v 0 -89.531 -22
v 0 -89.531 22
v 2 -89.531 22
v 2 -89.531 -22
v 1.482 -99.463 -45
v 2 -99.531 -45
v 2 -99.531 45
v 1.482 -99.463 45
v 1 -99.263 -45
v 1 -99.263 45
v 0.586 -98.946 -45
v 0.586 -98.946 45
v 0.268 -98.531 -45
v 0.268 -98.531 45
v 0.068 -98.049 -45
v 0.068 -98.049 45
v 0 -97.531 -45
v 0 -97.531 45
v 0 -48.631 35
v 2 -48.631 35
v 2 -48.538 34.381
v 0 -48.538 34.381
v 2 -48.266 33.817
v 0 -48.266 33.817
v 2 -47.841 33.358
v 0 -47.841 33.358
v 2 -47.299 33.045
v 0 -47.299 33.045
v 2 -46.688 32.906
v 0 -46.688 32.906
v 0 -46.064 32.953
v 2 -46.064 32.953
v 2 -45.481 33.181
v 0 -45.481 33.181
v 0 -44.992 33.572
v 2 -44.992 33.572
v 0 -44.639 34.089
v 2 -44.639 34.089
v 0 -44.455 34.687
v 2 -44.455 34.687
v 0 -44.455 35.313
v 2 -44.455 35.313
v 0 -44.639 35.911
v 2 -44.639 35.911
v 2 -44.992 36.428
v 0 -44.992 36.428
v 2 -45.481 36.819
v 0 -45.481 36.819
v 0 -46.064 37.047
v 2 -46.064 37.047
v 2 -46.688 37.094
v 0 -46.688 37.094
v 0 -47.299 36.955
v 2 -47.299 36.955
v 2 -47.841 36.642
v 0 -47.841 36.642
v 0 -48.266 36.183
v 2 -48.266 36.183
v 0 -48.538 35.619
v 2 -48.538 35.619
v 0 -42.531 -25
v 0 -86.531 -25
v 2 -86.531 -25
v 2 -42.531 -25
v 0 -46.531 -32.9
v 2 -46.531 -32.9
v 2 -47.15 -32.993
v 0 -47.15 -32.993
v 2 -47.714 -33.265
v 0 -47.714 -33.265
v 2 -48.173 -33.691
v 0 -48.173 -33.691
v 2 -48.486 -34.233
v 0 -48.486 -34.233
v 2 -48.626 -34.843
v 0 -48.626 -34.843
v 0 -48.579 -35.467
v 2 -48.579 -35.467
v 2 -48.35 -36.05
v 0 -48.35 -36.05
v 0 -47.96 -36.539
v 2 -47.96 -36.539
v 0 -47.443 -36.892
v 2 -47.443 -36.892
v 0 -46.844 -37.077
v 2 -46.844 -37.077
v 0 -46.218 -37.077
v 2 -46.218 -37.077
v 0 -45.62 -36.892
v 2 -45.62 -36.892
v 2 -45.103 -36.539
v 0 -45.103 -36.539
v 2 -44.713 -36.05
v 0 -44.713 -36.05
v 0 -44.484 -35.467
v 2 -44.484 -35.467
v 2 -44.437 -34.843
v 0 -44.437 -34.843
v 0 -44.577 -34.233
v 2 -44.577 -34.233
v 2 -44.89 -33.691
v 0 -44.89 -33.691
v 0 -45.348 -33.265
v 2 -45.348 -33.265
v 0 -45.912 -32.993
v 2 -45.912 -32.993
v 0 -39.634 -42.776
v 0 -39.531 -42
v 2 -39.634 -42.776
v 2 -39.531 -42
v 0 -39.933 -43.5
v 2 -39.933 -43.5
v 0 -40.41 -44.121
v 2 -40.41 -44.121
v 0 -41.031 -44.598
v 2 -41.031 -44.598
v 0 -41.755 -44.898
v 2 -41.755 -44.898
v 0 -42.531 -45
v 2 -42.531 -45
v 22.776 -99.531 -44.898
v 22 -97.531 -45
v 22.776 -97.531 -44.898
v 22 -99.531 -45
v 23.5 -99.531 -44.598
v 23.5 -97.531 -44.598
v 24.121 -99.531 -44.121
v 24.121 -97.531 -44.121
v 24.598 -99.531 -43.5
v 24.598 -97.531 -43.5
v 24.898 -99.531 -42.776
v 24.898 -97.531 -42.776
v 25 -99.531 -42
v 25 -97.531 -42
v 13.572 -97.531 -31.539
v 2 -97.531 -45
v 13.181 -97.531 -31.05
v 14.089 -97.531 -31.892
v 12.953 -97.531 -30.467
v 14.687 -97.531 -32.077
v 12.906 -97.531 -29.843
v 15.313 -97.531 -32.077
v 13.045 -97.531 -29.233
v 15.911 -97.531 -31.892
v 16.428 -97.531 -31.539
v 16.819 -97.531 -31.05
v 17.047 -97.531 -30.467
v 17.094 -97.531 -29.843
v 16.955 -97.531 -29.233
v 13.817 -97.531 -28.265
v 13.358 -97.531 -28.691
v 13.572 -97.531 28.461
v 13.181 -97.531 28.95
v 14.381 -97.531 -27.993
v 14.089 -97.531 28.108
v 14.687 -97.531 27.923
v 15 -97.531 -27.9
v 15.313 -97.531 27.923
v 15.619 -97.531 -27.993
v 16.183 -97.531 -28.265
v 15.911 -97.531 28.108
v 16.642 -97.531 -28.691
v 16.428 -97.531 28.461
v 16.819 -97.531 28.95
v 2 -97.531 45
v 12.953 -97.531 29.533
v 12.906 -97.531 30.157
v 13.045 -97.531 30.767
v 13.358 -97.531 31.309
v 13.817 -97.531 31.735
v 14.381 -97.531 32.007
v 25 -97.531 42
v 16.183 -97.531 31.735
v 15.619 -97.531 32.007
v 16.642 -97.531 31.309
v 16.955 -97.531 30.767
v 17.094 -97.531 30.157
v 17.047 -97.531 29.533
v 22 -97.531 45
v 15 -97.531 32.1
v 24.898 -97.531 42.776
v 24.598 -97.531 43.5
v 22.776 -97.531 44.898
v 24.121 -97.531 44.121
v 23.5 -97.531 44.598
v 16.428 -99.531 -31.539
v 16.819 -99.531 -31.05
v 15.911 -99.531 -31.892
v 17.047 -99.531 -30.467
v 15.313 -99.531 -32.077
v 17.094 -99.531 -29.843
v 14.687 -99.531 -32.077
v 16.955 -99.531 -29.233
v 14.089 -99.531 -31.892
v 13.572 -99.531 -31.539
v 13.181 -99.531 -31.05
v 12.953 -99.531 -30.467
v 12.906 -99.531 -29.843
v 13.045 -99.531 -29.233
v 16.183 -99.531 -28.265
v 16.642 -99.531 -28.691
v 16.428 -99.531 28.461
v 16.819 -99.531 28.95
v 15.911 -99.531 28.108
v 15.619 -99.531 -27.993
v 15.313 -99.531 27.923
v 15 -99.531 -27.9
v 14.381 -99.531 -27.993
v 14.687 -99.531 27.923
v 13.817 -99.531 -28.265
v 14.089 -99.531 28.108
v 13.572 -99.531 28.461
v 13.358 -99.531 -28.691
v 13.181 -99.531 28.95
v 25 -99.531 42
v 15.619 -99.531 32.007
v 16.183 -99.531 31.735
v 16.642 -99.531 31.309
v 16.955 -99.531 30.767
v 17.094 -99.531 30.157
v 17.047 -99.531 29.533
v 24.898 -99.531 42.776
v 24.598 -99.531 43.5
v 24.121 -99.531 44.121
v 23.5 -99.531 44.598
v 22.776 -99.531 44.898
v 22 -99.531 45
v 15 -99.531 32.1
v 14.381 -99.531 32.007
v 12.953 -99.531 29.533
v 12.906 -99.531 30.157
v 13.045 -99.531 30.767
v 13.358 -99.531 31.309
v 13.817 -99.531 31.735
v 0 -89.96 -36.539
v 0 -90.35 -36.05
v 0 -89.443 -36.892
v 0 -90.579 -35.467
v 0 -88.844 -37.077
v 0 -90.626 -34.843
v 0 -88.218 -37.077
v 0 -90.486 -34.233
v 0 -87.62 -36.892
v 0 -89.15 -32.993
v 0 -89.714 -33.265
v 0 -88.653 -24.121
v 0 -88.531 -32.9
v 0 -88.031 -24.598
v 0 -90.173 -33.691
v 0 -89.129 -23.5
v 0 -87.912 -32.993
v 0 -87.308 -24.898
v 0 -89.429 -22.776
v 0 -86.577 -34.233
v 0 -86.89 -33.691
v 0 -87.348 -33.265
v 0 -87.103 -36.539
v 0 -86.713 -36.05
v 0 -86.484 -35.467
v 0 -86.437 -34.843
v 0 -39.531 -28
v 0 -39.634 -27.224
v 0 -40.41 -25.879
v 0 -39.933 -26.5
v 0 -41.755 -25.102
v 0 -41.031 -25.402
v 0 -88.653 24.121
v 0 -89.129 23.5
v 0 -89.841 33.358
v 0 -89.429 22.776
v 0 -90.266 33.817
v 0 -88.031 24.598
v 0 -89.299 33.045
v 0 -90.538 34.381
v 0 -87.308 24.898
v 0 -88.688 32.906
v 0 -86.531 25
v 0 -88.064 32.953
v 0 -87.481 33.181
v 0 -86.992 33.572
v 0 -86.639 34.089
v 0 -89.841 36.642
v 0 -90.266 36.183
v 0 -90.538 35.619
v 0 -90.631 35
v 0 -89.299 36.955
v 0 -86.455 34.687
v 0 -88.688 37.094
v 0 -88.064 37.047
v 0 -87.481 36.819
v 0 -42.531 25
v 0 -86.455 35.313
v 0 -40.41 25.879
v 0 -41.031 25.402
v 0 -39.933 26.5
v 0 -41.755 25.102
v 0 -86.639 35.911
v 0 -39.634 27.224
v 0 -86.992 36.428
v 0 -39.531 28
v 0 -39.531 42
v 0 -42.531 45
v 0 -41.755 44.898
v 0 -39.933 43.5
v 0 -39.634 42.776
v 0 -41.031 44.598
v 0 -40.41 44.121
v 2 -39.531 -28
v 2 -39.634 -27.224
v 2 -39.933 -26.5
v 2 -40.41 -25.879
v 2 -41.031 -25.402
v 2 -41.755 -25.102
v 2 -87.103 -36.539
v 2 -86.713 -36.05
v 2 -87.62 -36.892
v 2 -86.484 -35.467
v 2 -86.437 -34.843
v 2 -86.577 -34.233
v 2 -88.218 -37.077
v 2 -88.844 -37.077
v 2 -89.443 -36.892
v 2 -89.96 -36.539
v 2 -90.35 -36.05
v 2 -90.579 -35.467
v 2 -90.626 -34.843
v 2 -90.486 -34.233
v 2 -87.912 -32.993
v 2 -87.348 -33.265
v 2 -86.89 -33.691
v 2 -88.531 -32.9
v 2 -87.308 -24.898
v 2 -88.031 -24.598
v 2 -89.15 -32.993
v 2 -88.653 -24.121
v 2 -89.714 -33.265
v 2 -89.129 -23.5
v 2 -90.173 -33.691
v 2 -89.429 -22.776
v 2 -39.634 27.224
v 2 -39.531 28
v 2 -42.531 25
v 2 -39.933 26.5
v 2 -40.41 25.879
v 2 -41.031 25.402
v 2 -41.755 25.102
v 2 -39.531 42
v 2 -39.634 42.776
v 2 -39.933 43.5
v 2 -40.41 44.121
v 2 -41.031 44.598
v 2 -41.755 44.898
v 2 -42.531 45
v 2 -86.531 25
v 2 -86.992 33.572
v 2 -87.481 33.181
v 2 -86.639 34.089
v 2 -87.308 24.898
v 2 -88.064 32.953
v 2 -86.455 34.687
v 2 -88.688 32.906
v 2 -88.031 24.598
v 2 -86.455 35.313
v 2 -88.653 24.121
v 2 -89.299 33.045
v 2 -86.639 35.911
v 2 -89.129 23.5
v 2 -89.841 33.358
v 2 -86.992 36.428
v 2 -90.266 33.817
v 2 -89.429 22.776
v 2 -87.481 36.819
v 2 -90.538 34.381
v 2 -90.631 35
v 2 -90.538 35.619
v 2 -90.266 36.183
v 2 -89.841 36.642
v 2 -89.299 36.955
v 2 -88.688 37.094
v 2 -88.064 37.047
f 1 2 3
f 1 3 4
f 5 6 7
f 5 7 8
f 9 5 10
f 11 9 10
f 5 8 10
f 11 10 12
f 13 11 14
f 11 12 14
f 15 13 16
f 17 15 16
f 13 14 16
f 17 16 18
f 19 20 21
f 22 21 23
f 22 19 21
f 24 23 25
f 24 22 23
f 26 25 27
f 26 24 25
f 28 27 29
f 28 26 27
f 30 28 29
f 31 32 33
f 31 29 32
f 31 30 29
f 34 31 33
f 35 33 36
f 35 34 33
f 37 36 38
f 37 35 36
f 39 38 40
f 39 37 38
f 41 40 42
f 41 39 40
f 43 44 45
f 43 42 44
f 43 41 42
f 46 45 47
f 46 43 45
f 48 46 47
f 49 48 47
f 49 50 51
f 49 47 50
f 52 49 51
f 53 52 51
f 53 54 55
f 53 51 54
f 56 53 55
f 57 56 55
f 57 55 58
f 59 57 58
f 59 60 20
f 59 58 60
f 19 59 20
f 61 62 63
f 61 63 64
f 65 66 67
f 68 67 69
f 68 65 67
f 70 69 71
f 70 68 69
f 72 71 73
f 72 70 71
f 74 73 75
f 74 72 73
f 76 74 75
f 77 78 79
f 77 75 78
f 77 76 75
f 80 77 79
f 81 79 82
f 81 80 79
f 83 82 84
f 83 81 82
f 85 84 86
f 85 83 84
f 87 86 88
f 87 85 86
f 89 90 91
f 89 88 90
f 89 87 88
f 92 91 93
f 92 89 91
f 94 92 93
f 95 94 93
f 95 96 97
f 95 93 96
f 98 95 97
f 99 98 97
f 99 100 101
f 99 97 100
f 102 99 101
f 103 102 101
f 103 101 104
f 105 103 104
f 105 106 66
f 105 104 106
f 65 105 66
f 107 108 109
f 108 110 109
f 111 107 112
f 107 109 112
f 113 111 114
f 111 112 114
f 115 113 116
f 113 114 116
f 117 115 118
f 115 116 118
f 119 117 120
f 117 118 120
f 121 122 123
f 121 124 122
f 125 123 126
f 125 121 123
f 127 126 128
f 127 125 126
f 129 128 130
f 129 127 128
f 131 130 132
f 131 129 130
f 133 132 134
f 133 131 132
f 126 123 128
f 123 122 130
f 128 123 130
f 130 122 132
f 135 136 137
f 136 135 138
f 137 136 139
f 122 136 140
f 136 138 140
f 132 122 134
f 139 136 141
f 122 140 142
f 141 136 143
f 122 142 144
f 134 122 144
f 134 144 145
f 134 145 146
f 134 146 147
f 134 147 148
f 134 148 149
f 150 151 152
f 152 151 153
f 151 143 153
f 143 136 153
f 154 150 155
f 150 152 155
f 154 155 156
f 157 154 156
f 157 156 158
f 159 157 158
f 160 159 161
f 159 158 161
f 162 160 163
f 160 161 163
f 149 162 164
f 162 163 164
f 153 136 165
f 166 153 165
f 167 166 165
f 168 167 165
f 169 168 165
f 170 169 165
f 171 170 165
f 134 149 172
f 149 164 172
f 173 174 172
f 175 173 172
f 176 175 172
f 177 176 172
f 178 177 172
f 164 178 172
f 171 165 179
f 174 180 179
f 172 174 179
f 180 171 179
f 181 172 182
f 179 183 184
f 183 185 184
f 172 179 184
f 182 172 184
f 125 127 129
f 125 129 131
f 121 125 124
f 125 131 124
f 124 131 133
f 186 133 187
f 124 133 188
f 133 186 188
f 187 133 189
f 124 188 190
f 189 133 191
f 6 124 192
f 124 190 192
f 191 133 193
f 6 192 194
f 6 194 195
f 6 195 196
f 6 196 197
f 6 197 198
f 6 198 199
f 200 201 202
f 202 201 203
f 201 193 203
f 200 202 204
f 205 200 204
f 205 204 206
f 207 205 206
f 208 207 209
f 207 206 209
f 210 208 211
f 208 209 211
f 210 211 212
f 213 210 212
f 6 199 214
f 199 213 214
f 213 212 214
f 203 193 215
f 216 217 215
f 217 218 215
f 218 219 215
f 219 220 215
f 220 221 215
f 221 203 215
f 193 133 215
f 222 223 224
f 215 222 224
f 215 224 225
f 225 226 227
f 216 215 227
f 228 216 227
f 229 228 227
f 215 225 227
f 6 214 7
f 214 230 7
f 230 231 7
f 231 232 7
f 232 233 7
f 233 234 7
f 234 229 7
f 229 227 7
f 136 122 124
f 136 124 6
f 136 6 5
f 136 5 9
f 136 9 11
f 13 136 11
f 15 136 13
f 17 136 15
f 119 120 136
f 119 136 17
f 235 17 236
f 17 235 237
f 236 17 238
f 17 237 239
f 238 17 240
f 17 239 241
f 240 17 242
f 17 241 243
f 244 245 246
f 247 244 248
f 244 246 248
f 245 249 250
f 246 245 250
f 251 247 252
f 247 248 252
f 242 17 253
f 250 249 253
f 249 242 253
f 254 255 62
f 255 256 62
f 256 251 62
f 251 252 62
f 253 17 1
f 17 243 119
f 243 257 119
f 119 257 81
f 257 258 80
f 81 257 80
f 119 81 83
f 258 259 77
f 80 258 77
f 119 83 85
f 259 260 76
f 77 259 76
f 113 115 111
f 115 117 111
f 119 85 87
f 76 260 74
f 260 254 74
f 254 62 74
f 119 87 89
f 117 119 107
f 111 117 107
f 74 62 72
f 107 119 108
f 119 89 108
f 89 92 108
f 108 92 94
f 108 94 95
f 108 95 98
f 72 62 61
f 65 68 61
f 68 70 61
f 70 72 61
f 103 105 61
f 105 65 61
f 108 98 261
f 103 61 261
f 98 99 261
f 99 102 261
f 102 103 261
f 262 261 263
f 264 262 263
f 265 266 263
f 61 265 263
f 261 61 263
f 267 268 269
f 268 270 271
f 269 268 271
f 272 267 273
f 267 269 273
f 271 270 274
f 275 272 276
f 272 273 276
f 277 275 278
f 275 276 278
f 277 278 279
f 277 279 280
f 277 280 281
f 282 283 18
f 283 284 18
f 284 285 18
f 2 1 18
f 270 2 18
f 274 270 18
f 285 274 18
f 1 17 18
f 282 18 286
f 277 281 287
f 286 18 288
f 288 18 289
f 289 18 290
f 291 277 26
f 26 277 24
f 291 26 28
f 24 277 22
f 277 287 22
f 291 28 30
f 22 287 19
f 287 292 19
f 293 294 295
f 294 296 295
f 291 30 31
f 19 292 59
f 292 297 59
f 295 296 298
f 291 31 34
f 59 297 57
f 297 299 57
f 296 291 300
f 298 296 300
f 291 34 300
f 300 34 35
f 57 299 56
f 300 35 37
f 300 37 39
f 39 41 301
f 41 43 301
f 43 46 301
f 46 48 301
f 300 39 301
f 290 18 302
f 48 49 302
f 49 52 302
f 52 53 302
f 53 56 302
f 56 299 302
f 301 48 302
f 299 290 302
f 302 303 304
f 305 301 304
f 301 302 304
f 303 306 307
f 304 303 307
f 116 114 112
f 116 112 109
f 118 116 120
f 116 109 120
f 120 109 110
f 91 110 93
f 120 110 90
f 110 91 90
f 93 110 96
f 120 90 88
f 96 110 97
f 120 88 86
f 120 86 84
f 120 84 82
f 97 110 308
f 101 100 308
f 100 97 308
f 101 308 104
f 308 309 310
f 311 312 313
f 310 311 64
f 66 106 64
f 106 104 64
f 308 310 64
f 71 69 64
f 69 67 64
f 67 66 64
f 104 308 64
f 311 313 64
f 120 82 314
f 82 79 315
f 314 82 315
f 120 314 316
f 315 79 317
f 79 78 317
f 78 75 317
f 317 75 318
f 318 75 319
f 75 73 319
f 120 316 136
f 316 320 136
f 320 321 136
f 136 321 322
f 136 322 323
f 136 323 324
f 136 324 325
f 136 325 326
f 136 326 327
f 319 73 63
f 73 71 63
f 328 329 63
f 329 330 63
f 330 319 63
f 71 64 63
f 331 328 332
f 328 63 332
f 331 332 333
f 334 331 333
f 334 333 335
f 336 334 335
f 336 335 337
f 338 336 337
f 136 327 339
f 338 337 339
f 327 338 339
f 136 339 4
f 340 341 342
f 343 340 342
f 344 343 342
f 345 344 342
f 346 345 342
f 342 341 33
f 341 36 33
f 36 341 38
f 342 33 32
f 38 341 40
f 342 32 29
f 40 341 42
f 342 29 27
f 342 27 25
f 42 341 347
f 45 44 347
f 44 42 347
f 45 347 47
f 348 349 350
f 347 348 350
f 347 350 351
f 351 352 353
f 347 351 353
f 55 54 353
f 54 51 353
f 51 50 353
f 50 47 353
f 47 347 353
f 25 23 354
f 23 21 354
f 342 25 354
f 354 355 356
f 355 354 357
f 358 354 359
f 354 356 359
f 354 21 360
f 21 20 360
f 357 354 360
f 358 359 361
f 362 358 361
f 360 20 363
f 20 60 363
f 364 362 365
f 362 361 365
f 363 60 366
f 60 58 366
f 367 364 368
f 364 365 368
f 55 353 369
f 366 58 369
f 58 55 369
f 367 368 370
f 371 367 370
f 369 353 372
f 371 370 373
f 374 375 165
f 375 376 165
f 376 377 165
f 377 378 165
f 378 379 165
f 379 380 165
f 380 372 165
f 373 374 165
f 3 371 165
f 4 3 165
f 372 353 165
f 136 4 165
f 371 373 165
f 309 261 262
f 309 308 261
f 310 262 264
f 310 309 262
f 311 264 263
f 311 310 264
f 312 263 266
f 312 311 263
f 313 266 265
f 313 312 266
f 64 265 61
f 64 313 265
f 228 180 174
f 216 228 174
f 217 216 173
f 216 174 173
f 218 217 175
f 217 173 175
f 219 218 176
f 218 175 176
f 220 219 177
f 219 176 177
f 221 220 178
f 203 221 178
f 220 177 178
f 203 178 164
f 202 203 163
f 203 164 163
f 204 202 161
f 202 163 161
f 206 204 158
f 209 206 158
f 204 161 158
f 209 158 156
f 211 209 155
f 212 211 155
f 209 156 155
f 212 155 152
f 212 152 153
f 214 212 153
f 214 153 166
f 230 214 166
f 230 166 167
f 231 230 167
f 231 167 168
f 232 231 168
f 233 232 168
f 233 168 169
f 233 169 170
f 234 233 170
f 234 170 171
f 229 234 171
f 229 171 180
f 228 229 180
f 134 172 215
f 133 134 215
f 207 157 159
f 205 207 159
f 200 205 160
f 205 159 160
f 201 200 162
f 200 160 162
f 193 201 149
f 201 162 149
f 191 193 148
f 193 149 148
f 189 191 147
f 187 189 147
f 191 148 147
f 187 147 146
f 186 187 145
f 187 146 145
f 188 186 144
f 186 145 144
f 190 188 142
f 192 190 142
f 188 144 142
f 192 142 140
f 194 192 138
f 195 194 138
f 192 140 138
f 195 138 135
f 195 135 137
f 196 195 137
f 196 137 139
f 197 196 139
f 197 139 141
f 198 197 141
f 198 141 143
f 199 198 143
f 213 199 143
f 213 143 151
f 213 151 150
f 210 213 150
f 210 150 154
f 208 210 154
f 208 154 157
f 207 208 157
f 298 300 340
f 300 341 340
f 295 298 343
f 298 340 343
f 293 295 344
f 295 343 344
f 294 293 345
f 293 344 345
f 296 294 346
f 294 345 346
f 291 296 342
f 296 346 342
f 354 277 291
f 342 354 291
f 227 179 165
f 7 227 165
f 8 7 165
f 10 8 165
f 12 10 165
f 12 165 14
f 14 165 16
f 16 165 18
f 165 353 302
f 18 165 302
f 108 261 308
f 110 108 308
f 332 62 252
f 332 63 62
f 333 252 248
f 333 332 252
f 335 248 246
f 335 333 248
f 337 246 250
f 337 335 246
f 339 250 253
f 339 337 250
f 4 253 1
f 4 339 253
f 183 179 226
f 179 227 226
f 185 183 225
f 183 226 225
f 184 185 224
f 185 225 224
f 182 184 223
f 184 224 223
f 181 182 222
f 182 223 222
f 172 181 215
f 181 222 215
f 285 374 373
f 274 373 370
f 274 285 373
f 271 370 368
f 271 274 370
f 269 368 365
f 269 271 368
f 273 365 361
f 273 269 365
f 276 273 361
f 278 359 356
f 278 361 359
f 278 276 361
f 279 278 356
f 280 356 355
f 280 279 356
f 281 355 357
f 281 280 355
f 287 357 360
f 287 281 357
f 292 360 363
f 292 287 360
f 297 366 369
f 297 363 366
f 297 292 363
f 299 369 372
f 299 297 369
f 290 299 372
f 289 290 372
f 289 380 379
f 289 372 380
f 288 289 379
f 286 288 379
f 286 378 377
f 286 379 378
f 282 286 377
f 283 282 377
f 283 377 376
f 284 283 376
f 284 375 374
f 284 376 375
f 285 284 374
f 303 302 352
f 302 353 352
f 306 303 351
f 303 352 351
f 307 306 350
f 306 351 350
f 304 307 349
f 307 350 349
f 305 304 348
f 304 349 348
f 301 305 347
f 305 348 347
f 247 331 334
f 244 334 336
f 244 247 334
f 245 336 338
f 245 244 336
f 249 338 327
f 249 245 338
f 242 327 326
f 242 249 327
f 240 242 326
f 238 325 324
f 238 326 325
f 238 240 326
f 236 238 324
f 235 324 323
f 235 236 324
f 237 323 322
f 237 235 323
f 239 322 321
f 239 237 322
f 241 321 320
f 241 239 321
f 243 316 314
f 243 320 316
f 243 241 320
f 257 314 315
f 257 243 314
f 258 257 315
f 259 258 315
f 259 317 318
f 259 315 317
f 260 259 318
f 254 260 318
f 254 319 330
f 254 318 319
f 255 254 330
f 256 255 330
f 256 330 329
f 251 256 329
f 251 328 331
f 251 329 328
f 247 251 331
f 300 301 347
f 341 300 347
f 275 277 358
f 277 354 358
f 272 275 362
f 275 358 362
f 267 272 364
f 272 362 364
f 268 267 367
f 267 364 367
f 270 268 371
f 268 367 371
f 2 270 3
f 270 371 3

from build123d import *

# Parameters (mm, degrees)
EXTRUDE_1_DEPTH     = 45
SKETCH_2_R          = 2.1
SKETCH_2_W          = 50
SKETCH_2_H          = 50
CUT_EXTRUDE_2_DEPTH = 113.055777281
SKETCH_3_R          = 2.1
CUT_EXTRUDE_3_DEPTH = 113.055777281
FILLET_1_R          = 3


with BuildPart() as part:
    # ｽｹｯﾁ1 → ﾎﾞｽ - 押し出し1 (new, symmetric)
    with BuildSketch(Plane.XY):
        with BuildLine():
            Line((0, -39.531388125), (2, -39.531388125))
            Line((2, -39.531388125), (2, -97.531388125))
            Line((2, -97.531388125), (25, -97.531388125))
            Line((25, -97.531388125), (25, -99.531388125))
            Line((25, -99.531388125), (2, -99.531388125))
            ThreePointArc((2, -99.531388125), (0.585786438, -98.945601688), (0, -97.531388125))
            Line((0, -97.531388125), (0, -39.531388125))
        make_face()
    extrude(amount=EXTRUDE_1_DEPTH, both=True)

    # ｽｹｯﾁ2 → ｶｯﾄ - 押し出し2 (cut, through all)
    with BuildSketch(Plane(origin=(0, 0, 0), x_dir=(0, 0, -1), z_dir=(1, 0, 0))):
        with Locations(Location((-35, -46.531388125, 0), (0, 0, 270))):
            Circle(SKETCH_2_R)
        with Locations(Location((-35, -88.531388125, 0), (0, 0, 270))):
            Circle(SKETCH_2_R)
        with Locations(Location((35, -88.531388125, 0), (0, 0, 180))):
            Circle(SKETCH_2_R)
        with Locations(Location((35, -46.531388125, 0), (0, 0, 180))):
            Circle(SKETCH_2_R)
        with Locations((0, -64.531388125)):
            Rectangle(SKETCH_2_W, SKETCH_2_H)
    extrude(amount=CUT_EXTRUDE_2_DEPTH, mode=Mode.SUBTRACT)

    # ｽｹｯﾁ3 → ｶｯﾄ - 押し出し3 (cut, through all)
    with BuildSketch(Plane(origin=(0, 0, 0), x_dir=(1, 0, 0), z_dir=(0, 1, 0))):
        with Locations(Location((15, 30, 0), (0, 0, 270))):
            Circle(SKETCH_3_R)
        with Locations(Location((15, -30, 0), (0, 0, 270))):
            Circle(SKETCH_3_R)
    extrude(amount=-CUT_EXTRUDE_3_DEPTH, mode=Mode.SUBTRACT)

    # ﾌｨﾚｯﾄ1
    fillet_1_edges = [part.edges().sort_by_distance(p)[0] for p in [
        (25, -98.531388125, 45),
        (1, -39.531388125, -25),
        (1, -39.531388125, 45),
        (1, -39.531388125, 25),
        (1, -89.531388125, 25),
        (1, -89.531388125, -25),
        (1, -39.531388125, -45),
        (25, -98.531388125, -45),
    ]]
    fillet(fillet_1_edges, radius=FILLET_1_R)


solid = part.part
